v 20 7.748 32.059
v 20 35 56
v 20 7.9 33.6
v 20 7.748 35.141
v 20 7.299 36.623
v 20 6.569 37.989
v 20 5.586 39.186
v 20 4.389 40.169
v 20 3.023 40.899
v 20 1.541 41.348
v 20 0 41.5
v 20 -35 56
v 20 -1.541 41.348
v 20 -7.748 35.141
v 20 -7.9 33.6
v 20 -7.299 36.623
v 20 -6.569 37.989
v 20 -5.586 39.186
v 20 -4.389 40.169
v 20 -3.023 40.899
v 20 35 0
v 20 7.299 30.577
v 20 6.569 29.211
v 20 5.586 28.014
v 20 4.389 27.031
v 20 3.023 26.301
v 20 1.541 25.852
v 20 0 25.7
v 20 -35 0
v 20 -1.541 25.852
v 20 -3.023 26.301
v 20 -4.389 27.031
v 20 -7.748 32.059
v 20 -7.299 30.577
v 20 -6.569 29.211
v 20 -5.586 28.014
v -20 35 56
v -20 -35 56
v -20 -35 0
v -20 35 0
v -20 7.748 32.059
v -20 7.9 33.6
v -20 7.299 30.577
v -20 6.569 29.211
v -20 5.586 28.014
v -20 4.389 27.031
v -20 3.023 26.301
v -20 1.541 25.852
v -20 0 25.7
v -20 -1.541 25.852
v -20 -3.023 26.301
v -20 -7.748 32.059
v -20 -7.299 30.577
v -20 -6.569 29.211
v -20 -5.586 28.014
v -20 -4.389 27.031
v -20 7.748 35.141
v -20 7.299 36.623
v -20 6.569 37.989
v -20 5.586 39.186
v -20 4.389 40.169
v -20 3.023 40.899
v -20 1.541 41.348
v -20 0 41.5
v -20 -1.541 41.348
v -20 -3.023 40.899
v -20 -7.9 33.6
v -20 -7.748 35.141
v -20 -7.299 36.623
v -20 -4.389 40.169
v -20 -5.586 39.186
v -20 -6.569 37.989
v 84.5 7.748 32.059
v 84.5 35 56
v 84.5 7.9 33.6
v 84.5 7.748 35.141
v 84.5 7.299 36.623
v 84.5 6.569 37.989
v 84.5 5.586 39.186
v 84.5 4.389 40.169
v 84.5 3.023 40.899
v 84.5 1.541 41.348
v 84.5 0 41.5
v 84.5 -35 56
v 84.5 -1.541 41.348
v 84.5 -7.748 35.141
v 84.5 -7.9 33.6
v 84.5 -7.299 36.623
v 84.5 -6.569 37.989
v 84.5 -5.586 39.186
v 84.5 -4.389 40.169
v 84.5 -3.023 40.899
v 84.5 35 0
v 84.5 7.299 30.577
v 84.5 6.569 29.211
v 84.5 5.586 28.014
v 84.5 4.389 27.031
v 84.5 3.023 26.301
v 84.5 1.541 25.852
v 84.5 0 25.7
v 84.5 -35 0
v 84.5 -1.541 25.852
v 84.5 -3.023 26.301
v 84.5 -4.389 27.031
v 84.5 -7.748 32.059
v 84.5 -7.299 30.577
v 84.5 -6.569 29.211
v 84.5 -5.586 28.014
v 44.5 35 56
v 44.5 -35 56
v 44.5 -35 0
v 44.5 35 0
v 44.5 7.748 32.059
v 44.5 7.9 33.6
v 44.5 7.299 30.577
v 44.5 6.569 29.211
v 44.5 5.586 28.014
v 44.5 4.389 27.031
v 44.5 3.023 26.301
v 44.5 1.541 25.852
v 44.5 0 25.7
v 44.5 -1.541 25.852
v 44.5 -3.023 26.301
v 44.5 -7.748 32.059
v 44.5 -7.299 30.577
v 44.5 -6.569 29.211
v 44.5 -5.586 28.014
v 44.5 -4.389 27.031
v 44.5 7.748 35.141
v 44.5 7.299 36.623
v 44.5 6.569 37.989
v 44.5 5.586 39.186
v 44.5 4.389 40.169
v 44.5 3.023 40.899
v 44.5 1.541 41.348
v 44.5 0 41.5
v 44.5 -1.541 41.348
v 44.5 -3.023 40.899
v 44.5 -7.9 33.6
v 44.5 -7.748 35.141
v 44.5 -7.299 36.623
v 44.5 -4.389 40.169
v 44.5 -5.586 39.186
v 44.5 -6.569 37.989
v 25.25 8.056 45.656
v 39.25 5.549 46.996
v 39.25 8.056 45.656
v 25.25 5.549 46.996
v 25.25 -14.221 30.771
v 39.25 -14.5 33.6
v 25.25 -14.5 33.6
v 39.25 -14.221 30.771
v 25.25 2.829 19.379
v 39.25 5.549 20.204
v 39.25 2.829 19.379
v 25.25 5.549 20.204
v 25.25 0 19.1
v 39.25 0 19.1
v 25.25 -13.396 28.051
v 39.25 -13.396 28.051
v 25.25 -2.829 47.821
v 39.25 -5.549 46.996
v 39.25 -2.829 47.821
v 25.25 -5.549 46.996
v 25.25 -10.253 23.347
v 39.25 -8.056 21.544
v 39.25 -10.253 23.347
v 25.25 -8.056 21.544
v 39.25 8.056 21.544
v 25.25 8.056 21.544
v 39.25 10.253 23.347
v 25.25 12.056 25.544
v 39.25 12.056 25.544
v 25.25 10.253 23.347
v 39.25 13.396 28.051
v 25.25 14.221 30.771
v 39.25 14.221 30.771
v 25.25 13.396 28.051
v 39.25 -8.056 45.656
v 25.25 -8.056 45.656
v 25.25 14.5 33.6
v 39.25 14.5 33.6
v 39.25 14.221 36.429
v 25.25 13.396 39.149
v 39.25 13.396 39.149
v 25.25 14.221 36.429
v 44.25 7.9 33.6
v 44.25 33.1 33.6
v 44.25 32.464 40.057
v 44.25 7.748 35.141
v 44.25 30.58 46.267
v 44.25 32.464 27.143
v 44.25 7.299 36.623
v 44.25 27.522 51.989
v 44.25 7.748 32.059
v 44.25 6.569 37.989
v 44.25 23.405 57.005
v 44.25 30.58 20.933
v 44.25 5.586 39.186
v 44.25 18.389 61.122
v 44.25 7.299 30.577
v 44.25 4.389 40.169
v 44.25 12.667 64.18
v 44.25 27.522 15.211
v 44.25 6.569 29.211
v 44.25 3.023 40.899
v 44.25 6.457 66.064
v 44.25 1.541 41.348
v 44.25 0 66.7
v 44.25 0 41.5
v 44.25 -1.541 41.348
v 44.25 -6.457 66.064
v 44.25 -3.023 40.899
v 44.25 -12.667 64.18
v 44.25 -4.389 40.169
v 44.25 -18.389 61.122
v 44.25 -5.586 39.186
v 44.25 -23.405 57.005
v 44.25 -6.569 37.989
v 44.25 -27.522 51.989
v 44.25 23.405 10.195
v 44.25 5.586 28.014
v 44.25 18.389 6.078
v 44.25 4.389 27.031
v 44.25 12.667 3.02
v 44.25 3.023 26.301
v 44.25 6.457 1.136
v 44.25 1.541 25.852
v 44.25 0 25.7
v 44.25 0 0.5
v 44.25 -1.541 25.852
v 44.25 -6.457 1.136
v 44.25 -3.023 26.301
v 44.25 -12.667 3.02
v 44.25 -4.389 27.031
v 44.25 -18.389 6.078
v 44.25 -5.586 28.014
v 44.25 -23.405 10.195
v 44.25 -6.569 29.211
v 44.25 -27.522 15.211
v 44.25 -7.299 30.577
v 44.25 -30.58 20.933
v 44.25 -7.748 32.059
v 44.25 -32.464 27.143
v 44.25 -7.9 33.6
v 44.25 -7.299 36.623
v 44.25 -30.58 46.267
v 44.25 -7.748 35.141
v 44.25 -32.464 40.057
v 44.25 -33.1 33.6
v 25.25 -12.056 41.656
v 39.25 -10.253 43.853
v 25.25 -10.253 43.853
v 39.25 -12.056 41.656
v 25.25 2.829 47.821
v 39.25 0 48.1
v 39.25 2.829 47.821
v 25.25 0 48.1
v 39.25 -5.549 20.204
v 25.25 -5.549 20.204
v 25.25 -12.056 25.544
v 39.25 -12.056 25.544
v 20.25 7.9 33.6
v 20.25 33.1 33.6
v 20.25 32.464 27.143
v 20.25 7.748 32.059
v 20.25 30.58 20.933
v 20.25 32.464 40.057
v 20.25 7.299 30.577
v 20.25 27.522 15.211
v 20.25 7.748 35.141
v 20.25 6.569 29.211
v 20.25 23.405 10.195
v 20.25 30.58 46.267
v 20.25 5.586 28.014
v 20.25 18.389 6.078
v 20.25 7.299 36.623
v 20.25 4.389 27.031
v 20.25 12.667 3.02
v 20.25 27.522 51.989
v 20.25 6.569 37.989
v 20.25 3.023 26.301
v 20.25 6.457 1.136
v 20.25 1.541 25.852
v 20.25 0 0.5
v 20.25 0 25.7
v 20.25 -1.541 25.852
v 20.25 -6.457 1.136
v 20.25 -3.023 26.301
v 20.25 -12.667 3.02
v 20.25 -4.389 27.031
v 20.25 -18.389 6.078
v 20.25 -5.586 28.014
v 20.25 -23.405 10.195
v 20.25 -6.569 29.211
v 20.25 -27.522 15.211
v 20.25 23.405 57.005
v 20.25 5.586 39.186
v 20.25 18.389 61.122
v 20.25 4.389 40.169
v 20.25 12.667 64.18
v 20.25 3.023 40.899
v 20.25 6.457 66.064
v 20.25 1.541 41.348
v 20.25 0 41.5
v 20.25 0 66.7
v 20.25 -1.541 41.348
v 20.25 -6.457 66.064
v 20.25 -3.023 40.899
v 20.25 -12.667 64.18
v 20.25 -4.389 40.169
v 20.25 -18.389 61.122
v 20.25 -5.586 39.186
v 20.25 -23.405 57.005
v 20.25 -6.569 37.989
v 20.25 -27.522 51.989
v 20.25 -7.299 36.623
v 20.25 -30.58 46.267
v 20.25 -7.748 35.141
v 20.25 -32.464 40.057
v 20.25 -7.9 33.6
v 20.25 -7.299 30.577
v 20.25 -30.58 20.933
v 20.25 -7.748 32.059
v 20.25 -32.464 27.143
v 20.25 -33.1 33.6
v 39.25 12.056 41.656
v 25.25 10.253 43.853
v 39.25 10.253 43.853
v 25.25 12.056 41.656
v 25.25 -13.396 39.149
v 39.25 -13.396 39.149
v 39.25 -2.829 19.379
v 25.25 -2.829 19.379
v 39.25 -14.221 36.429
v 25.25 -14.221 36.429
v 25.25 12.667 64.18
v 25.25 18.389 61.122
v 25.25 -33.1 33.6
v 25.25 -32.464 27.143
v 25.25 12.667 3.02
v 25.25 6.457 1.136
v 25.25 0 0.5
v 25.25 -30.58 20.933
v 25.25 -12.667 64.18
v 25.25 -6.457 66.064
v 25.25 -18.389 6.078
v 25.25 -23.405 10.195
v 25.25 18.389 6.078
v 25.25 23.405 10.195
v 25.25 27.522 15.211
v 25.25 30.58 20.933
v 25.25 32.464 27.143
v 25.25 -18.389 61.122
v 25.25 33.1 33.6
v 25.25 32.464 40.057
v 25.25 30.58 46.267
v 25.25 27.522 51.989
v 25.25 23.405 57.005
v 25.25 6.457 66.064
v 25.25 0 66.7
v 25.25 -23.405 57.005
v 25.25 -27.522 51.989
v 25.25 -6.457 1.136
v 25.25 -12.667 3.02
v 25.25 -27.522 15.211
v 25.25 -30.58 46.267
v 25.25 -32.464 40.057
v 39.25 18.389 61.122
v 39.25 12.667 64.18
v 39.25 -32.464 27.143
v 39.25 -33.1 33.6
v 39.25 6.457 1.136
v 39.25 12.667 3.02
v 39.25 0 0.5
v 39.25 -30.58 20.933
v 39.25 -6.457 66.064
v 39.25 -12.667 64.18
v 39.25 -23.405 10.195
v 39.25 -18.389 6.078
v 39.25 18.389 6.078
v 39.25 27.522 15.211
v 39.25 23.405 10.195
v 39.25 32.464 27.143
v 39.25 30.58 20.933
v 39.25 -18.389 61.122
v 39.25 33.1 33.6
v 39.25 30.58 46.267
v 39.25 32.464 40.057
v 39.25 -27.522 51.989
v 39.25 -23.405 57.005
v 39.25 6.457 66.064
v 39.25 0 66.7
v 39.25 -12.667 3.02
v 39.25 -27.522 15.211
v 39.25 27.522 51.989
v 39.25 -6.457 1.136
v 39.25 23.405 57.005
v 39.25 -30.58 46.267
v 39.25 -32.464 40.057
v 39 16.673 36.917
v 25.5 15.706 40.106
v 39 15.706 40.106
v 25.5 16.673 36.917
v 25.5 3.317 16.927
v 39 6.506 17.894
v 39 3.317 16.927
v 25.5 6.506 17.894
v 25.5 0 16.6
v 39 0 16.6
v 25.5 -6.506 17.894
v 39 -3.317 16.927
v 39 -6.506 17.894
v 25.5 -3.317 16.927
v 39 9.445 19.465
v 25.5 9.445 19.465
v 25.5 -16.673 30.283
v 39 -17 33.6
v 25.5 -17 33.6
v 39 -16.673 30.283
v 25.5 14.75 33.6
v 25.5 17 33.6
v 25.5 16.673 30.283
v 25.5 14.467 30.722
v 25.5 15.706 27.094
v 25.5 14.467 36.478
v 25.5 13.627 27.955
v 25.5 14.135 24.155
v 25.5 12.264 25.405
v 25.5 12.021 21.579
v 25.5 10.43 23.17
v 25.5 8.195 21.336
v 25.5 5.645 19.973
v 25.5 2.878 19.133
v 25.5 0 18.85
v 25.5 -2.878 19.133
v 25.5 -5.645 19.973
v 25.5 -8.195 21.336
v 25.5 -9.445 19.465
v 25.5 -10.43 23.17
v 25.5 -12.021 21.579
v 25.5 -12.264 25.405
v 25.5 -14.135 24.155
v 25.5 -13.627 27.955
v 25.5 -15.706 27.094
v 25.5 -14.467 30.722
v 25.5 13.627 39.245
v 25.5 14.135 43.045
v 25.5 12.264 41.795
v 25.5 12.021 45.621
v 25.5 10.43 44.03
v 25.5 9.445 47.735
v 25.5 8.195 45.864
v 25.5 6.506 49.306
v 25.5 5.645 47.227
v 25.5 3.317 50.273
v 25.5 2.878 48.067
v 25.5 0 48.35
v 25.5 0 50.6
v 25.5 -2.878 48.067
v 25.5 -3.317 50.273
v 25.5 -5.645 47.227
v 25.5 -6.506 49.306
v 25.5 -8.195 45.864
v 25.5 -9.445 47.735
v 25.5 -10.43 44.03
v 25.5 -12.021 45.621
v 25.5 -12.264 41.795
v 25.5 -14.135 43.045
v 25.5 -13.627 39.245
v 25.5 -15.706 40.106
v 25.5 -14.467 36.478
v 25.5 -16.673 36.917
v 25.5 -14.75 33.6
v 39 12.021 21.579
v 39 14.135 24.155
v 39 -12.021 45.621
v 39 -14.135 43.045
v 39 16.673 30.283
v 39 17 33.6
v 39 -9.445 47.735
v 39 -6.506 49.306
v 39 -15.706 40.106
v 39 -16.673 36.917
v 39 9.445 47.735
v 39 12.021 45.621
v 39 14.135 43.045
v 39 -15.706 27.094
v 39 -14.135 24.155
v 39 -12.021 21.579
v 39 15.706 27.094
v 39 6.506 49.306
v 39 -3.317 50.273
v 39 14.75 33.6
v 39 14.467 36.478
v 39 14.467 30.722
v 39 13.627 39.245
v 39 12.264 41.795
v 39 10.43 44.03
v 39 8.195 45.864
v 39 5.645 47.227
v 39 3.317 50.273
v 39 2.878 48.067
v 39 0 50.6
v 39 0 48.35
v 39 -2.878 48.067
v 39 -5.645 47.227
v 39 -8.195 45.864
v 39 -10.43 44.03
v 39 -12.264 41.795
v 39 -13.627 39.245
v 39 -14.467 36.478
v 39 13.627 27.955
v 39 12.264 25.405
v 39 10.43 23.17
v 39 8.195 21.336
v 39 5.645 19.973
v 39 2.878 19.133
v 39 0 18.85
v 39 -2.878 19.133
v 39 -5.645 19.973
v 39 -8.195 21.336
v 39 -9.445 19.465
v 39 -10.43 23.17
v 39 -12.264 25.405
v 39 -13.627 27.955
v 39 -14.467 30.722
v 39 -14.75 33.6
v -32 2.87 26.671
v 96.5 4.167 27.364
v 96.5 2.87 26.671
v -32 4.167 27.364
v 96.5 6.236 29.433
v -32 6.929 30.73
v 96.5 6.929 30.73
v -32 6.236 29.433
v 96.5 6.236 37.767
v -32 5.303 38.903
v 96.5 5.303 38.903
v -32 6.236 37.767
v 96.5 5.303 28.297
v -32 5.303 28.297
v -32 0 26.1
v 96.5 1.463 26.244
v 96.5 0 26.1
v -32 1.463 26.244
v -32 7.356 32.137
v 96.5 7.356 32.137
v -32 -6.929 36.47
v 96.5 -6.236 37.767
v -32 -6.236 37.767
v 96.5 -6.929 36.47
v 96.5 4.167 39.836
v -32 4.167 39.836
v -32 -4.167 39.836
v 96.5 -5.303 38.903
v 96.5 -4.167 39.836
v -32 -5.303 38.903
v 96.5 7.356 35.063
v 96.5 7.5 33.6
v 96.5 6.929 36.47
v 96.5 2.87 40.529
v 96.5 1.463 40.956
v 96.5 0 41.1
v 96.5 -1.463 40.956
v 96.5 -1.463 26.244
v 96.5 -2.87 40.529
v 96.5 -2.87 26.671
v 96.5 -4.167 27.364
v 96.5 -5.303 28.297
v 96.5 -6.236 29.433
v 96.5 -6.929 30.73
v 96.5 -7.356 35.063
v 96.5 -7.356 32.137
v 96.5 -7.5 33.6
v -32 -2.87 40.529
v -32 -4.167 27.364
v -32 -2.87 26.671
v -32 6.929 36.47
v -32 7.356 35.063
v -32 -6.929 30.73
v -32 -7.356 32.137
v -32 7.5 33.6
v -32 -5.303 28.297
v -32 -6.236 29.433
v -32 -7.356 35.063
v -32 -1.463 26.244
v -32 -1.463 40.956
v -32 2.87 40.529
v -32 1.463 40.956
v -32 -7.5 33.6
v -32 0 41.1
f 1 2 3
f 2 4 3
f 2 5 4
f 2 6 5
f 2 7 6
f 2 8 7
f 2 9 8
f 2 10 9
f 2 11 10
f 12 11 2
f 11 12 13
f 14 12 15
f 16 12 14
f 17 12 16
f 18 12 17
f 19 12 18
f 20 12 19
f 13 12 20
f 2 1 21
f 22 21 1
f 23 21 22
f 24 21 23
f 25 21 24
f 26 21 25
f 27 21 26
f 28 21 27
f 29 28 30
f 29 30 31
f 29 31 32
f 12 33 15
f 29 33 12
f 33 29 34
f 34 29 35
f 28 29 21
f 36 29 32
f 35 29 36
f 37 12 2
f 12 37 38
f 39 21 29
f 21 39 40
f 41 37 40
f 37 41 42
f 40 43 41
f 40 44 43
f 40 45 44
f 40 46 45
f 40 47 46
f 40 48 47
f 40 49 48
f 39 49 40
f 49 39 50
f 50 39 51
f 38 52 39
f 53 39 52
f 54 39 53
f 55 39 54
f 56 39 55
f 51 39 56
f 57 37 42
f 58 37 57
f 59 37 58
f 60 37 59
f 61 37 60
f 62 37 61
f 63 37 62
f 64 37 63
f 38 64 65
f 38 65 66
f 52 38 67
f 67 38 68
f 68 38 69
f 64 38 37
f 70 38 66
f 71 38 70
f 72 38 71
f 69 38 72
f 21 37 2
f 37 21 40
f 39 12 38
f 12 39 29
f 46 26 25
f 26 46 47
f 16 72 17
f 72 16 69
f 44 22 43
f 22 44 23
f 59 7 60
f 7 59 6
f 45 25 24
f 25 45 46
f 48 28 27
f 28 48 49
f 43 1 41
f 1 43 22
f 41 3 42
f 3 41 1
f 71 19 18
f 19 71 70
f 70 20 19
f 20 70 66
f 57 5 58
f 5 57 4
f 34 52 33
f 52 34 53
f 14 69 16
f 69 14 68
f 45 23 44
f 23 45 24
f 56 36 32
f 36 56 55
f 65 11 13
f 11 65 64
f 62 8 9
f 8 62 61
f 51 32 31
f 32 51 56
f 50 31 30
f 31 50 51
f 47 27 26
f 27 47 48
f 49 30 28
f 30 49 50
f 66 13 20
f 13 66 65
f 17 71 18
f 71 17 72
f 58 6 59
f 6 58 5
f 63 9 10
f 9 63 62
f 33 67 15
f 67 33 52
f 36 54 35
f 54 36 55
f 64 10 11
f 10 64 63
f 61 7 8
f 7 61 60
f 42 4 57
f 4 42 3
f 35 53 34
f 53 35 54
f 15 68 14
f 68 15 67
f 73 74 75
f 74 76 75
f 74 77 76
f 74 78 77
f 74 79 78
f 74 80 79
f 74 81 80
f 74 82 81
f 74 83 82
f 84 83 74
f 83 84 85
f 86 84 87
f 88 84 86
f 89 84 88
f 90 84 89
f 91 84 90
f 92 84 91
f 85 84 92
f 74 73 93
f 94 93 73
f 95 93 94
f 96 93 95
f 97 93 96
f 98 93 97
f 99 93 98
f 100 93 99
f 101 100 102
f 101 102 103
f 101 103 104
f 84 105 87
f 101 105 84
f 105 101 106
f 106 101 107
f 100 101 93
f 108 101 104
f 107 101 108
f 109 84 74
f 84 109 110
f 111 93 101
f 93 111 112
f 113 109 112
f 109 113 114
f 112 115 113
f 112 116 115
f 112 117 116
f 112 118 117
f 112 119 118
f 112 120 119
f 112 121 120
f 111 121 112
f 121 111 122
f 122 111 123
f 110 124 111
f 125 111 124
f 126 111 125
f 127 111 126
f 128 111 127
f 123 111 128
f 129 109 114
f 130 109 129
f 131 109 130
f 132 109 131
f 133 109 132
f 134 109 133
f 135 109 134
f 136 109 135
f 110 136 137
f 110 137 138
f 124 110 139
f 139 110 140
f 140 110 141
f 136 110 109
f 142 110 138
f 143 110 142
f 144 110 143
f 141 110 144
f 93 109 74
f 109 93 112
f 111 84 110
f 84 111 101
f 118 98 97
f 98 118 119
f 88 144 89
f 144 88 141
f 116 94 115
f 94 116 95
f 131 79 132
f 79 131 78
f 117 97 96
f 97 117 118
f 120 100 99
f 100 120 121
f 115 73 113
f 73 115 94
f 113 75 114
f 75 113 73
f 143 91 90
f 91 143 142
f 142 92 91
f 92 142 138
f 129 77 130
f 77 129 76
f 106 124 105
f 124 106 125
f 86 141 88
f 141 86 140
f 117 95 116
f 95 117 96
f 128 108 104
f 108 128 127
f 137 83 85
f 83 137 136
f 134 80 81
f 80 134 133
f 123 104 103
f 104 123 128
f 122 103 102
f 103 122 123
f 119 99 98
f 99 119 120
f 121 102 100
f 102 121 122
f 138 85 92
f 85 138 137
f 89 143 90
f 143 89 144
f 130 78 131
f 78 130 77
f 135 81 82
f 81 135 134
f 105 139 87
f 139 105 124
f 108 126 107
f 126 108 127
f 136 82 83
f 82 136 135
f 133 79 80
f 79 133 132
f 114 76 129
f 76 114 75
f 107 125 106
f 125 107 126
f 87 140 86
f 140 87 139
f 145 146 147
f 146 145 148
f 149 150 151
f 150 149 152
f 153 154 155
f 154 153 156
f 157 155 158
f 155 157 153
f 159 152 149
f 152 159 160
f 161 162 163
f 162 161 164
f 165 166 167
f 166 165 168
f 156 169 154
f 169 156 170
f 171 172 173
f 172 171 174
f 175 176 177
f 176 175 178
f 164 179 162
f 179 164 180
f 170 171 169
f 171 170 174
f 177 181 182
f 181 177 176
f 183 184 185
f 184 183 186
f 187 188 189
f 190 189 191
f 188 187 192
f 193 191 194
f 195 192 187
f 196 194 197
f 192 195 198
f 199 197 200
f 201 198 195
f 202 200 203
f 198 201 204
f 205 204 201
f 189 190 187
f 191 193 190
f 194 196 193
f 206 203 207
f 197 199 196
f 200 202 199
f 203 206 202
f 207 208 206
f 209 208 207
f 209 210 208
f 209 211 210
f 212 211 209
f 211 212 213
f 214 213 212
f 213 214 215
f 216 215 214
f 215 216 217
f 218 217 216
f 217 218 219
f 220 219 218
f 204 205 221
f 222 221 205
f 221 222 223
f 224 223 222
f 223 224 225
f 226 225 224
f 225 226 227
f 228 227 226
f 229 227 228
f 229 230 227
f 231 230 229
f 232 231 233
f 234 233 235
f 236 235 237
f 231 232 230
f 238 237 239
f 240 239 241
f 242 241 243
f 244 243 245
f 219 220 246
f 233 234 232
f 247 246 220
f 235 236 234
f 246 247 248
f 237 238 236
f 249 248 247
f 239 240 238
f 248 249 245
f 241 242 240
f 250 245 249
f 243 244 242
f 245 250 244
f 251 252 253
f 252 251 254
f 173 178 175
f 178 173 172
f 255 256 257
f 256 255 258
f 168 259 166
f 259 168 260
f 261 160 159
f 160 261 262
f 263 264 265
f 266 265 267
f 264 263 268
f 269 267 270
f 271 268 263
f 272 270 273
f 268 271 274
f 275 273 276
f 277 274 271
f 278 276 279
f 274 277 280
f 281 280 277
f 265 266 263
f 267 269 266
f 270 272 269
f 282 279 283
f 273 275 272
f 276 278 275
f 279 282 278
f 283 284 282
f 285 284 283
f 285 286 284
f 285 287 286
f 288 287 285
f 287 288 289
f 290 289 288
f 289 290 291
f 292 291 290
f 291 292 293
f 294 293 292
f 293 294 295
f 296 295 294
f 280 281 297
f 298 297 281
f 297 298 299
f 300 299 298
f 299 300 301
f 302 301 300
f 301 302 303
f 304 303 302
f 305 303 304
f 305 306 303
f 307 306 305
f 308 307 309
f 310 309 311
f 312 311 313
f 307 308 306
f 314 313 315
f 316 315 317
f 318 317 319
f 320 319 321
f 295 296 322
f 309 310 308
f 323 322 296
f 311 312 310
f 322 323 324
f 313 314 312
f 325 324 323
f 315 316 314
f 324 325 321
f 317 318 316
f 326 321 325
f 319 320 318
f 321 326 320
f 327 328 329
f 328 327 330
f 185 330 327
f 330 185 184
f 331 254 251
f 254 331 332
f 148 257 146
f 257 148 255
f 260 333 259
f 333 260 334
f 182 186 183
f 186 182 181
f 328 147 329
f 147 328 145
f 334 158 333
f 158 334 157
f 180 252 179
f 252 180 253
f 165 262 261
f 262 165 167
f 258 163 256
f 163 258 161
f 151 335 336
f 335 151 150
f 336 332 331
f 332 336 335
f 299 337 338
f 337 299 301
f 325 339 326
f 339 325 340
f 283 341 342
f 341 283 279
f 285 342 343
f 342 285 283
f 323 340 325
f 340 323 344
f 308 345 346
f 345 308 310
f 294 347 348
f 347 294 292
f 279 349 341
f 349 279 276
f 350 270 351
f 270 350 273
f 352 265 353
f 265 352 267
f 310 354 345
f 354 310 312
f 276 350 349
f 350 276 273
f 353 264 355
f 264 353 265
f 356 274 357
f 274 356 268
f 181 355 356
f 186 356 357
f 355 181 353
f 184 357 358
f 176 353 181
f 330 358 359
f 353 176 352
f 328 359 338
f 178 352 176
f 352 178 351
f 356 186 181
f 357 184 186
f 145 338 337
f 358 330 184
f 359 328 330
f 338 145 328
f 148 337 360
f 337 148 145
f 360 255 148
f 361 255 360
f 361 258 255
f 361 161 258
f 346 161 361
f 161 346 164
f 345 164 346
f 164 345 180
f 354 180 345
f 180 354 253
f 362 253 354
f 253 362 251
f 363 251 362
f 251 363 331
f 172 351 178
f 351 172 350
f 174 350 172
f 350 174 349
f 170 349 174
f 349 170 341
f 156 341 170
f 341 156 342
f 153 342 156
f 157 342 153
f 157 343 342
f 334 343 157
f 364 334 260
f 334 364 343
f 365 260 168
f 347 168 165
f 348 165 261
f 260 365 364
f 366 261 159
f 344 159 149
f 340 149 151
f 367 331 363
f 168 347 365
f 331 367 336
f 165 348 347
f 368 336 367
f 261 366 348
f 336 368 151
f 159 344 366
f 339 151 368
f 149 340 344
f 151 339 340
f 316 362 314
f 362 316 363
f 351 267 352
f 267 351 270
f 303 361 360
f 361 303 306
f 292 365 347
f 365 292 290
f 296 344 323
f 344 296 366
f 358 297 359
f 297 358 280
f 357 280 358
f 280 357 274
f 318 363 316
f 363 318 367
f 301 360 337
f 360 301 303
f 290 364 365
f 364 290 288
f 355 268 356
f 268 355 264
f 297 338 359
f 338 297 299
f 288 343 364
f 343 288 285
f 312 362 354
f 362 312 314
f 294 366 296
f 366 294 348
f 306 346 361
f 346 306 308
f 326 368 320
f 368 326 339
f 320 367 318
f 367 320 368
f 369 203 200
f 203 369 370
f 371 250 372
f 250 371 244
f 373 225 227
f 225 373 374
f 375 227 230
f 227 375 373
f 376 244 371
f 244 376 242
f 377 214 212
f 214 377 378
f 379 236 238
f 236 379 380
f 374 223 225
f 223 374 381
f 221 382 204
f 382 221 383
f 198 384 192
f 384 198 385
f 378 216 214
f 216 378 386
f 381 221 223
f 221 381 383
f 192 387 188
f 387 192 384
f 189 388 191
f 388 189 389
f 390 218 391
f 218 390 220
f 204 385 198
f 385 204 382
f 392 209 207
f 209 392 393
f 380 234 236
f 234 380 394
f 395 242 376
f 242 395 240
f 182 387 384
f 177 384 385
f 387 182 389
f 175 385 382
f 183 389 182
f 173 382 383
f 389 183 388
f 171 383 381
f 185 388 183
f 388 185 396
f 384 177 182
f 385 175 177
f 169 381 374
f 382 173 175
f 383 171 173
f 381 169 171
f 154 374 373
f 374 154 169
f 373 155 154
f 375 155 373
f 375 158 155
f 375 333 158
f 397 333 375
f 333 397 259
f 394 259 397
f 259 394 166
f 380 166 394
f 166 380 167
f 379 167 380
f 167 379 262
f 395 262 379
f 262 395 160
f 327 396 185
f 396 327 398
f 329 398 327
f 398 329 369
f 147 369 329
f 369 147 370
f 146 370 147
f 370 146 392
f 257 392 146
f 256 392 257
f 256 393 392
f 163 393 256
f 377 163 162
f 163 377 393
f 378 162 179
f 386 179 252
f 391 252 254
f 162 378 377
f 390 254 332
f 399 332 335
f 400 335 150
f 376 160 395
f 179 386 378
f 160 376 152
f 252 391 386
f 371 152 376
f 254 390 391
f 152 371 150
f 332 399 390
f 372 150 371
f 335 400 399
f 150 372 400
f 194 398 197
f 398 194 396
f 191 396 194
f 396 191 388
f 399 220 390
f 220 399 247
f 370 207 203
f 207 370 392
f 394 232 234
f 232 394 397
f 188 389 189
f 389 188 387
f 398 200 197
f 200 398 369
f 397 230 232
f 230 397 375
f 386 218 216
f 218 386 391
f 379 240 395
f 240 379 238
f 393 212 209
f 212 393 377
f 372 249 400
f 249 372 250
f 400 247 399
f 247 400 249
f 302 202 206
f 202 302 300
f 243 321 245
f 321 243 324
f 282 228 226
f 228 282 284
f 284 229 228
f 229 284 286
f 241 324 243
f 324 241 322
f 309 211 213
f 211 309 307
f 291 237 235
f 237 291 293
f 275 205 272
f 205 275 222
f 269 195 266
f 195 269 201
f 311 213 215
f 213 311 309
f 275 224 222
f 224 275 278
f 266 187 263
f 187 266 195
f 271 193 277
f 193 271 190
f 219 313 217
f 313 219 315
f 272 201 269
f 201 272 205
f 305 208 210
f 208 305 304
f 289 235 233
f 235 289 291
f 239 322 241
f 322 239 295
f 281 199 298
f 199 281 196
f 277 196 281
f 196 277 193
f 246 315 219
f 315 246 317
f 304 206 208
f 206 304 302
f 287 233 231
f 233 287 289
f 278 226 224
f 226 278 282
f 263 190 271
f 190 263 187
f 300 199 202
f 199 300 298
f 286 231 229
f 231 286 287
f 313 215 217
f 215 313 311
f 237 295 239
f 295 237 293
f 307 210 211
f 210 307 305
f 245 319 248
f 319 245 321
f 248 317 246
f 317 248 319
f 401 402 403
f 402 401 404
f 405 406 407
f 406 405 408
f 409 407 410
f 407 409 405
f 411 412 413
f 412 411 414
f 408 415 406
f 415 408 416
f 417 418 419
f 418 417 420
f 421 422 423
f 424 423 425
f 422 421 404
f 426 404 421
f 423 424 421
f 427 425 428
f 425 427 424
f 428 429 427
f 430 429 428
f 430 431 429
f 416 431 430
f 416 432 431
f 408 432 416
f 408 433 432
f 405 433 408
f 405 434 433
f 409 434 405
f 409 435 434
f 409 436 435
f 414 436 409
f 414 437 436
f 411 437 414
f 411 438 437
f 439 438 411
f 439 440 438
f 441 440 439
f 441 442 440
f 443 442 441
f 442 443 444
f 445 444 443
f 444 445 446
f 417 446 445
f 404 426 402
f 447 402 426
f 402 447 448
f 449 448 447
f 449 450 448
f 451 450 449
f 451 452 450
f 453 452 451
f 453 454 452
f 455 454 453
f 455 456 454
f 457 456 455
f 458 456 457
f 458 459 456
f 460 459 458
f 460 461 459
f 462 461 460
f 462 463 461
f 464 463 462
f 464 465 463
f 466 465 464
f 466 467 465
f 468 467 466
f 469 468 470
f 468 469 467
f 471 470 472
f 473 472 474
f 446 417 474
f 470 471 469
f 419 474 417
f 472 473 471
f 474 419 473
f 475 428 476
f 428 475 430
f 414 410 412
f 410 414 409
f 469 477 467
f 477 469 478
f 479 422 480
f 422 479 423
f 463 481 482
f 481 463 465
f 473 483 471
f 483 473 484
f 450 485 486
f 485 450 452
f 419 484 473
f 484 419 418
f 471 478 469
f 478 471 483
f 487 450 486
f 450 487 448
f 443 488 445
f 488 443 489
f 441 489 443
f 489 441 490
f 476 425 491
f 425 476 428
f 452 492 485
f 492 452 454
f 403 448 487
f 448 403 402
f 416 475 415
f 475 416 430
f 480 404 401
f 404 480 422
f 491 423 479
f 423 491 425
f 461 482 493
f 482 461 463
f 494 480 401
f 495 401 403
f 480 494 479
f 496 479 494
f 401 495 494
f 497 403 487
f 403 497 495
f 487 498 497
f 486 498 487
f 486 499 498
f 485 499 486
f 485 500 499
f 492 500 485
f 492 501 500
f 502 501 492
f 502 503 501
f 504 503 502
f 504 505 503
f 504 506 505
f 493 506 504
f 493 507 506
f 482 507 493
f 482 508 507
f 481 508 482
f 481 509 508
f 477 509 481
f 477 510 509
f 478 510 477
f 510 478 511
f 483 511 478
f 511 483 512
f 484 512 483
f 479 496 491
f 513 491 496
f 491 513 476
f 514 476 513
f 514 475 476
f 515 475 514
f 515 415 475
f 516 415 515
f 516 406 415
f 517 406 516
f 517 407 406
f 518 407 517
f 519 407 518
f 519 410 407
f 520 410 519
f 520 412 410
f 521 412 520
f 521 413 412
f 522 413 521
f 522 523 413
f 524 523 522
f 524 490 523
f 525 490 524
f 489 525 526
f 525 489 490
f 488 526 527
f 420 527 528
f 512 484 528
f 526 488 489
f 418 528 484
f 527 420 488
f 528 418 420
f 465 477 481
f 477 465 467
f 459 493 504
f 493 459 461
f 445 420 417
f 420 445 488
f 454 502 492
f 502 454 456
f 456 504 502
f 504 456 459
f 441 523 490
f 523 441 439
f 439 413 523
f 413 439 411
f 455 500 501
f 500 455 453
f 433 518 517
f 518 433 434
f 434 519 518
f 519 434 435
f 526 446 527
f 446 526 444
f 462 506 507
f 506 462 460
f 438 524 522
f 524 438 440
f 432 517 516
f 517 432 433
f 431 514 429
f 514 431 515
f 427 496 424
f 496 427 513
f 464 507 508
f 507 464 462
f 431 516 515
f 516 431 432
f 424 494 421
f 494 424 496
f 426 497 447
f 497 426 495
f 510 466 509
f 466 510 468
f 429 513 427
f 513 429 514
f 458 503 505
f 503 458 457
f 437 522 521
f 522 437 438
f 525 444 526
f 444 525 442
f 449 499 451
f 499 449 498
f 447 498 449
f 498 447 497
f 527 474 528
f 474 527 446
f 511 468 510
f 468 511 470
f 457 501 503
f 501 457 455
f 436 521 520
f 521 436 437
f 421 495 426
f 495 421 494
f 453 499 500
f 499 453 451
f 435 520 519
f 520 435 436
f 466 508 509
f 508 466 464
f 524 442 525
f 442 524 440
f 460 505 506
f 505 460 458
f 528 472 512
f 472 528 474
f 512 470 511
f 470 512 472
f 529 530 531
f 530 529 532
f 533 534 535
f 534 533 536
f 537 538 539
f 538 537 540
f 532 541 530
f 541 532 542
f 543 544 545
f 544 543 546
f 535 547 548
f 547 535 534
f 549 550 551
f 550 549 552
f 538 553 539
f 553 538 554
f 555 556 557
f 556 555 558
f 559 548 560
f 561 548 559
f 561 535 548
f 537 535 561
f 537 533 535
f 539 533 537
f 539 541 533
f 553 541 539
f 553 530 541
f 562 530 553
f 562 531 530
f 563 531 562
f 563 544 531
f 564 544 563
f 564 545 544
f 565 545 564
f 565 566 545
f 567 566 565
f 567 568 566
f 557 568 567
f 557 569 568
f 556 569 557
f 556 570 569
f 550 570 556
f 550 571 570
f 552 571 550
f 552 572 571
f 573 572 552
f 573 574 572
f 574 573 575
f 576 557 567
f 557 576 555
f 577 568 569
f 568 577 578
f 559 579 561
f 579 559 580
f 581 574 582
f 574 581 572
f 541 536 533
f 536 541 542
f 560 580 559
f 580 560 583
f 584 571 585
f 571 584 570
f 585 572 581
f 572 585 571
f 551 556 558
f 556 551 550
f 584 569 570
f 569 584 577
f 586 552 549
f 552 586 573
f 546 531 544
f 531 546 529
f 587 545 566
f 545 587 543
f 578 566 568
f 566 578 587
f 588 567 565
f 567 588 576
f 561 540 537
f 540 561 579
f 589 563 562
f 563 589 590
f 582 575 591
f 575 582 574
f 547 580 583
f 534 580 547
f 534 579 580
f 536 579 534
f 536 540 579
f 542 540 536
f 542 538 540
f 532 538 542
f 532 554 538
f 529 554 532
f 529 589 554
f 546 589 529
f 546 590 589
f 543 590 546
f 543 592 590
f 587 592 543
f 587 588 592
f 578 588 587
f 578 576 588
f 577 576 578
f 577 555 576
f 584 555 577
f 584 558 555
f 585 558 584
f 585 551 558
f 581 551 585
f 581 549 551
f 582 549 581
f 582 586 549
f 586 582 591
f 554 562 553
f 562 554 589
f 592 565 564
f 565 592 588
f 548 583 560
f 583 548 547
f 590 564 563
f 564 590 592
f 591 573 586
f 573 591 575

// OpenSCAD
$fn = 32;

// ------------------------------------------------------------------------
// Pulley assembly: d66.2 pulley with a belt, shaft d15
// Every part is its own module, assembly() places them once.
// ------------------------------------------------------------------------

// --- part 1 ---
module support1() {
  difference() {
    translate([-20, -35, 0]) cube([40, 70, 56]);
    translate([0, 0, 33.6]) rotate([0, 90, 0]) cylinder(h = 42, d = 15.8, center = true);
  }
}

// --- part 2 ---
module support2() {
  difference() {
    translate([-20, -35, 0]) cube([40, 70, 56]);
    translate([0, 0, 33.6]) rotate([0, 90, 0]) cylinder(h = 42, d = 15.8, center = true);
  }
}

// --- part 3 ---
module shaft() {
  translate([0, 0, -64.25]) cylinder(h = 128.5, d = 15);
}

// --- part 4 ---
module pulley() {
  difference() {
    union() {
      cylinder(h = 24, d = 29);
      cylinder(h = 5, d = 66.2);
      translate([0, 0, 19]) cylinder(h = 5, d = 66.2);
    }
    translate([0, 0, -1]) cylinder(h = 26, d = 15.8);
  }
}

// --- part 5 ---
module belt() {
  difference() {
      translate([0, 0, 0]) cylinder(h = 13.5, d = 34);
      translate([0, 0, -1]) cylinder(h = 15.5, d = 29.5);
    }
}

// --- assembly ---
module assembly() {
  translate([0, 0, 0]) rotate([0, 0, 0]) support1();
  translate([64.5, 0, 0]) rotate([0, 0, 0]) support2();
  translate([32.25, 0, 33.6]) rotate([0, 90, 0]) shaft();
  translate([20.25, 0, 33.6]) rotate([0, 90, 0]) pulley();
  translate([25.5, 0, 33.6]) rotate([0, 90, 0]) belt();
}

assembly();
